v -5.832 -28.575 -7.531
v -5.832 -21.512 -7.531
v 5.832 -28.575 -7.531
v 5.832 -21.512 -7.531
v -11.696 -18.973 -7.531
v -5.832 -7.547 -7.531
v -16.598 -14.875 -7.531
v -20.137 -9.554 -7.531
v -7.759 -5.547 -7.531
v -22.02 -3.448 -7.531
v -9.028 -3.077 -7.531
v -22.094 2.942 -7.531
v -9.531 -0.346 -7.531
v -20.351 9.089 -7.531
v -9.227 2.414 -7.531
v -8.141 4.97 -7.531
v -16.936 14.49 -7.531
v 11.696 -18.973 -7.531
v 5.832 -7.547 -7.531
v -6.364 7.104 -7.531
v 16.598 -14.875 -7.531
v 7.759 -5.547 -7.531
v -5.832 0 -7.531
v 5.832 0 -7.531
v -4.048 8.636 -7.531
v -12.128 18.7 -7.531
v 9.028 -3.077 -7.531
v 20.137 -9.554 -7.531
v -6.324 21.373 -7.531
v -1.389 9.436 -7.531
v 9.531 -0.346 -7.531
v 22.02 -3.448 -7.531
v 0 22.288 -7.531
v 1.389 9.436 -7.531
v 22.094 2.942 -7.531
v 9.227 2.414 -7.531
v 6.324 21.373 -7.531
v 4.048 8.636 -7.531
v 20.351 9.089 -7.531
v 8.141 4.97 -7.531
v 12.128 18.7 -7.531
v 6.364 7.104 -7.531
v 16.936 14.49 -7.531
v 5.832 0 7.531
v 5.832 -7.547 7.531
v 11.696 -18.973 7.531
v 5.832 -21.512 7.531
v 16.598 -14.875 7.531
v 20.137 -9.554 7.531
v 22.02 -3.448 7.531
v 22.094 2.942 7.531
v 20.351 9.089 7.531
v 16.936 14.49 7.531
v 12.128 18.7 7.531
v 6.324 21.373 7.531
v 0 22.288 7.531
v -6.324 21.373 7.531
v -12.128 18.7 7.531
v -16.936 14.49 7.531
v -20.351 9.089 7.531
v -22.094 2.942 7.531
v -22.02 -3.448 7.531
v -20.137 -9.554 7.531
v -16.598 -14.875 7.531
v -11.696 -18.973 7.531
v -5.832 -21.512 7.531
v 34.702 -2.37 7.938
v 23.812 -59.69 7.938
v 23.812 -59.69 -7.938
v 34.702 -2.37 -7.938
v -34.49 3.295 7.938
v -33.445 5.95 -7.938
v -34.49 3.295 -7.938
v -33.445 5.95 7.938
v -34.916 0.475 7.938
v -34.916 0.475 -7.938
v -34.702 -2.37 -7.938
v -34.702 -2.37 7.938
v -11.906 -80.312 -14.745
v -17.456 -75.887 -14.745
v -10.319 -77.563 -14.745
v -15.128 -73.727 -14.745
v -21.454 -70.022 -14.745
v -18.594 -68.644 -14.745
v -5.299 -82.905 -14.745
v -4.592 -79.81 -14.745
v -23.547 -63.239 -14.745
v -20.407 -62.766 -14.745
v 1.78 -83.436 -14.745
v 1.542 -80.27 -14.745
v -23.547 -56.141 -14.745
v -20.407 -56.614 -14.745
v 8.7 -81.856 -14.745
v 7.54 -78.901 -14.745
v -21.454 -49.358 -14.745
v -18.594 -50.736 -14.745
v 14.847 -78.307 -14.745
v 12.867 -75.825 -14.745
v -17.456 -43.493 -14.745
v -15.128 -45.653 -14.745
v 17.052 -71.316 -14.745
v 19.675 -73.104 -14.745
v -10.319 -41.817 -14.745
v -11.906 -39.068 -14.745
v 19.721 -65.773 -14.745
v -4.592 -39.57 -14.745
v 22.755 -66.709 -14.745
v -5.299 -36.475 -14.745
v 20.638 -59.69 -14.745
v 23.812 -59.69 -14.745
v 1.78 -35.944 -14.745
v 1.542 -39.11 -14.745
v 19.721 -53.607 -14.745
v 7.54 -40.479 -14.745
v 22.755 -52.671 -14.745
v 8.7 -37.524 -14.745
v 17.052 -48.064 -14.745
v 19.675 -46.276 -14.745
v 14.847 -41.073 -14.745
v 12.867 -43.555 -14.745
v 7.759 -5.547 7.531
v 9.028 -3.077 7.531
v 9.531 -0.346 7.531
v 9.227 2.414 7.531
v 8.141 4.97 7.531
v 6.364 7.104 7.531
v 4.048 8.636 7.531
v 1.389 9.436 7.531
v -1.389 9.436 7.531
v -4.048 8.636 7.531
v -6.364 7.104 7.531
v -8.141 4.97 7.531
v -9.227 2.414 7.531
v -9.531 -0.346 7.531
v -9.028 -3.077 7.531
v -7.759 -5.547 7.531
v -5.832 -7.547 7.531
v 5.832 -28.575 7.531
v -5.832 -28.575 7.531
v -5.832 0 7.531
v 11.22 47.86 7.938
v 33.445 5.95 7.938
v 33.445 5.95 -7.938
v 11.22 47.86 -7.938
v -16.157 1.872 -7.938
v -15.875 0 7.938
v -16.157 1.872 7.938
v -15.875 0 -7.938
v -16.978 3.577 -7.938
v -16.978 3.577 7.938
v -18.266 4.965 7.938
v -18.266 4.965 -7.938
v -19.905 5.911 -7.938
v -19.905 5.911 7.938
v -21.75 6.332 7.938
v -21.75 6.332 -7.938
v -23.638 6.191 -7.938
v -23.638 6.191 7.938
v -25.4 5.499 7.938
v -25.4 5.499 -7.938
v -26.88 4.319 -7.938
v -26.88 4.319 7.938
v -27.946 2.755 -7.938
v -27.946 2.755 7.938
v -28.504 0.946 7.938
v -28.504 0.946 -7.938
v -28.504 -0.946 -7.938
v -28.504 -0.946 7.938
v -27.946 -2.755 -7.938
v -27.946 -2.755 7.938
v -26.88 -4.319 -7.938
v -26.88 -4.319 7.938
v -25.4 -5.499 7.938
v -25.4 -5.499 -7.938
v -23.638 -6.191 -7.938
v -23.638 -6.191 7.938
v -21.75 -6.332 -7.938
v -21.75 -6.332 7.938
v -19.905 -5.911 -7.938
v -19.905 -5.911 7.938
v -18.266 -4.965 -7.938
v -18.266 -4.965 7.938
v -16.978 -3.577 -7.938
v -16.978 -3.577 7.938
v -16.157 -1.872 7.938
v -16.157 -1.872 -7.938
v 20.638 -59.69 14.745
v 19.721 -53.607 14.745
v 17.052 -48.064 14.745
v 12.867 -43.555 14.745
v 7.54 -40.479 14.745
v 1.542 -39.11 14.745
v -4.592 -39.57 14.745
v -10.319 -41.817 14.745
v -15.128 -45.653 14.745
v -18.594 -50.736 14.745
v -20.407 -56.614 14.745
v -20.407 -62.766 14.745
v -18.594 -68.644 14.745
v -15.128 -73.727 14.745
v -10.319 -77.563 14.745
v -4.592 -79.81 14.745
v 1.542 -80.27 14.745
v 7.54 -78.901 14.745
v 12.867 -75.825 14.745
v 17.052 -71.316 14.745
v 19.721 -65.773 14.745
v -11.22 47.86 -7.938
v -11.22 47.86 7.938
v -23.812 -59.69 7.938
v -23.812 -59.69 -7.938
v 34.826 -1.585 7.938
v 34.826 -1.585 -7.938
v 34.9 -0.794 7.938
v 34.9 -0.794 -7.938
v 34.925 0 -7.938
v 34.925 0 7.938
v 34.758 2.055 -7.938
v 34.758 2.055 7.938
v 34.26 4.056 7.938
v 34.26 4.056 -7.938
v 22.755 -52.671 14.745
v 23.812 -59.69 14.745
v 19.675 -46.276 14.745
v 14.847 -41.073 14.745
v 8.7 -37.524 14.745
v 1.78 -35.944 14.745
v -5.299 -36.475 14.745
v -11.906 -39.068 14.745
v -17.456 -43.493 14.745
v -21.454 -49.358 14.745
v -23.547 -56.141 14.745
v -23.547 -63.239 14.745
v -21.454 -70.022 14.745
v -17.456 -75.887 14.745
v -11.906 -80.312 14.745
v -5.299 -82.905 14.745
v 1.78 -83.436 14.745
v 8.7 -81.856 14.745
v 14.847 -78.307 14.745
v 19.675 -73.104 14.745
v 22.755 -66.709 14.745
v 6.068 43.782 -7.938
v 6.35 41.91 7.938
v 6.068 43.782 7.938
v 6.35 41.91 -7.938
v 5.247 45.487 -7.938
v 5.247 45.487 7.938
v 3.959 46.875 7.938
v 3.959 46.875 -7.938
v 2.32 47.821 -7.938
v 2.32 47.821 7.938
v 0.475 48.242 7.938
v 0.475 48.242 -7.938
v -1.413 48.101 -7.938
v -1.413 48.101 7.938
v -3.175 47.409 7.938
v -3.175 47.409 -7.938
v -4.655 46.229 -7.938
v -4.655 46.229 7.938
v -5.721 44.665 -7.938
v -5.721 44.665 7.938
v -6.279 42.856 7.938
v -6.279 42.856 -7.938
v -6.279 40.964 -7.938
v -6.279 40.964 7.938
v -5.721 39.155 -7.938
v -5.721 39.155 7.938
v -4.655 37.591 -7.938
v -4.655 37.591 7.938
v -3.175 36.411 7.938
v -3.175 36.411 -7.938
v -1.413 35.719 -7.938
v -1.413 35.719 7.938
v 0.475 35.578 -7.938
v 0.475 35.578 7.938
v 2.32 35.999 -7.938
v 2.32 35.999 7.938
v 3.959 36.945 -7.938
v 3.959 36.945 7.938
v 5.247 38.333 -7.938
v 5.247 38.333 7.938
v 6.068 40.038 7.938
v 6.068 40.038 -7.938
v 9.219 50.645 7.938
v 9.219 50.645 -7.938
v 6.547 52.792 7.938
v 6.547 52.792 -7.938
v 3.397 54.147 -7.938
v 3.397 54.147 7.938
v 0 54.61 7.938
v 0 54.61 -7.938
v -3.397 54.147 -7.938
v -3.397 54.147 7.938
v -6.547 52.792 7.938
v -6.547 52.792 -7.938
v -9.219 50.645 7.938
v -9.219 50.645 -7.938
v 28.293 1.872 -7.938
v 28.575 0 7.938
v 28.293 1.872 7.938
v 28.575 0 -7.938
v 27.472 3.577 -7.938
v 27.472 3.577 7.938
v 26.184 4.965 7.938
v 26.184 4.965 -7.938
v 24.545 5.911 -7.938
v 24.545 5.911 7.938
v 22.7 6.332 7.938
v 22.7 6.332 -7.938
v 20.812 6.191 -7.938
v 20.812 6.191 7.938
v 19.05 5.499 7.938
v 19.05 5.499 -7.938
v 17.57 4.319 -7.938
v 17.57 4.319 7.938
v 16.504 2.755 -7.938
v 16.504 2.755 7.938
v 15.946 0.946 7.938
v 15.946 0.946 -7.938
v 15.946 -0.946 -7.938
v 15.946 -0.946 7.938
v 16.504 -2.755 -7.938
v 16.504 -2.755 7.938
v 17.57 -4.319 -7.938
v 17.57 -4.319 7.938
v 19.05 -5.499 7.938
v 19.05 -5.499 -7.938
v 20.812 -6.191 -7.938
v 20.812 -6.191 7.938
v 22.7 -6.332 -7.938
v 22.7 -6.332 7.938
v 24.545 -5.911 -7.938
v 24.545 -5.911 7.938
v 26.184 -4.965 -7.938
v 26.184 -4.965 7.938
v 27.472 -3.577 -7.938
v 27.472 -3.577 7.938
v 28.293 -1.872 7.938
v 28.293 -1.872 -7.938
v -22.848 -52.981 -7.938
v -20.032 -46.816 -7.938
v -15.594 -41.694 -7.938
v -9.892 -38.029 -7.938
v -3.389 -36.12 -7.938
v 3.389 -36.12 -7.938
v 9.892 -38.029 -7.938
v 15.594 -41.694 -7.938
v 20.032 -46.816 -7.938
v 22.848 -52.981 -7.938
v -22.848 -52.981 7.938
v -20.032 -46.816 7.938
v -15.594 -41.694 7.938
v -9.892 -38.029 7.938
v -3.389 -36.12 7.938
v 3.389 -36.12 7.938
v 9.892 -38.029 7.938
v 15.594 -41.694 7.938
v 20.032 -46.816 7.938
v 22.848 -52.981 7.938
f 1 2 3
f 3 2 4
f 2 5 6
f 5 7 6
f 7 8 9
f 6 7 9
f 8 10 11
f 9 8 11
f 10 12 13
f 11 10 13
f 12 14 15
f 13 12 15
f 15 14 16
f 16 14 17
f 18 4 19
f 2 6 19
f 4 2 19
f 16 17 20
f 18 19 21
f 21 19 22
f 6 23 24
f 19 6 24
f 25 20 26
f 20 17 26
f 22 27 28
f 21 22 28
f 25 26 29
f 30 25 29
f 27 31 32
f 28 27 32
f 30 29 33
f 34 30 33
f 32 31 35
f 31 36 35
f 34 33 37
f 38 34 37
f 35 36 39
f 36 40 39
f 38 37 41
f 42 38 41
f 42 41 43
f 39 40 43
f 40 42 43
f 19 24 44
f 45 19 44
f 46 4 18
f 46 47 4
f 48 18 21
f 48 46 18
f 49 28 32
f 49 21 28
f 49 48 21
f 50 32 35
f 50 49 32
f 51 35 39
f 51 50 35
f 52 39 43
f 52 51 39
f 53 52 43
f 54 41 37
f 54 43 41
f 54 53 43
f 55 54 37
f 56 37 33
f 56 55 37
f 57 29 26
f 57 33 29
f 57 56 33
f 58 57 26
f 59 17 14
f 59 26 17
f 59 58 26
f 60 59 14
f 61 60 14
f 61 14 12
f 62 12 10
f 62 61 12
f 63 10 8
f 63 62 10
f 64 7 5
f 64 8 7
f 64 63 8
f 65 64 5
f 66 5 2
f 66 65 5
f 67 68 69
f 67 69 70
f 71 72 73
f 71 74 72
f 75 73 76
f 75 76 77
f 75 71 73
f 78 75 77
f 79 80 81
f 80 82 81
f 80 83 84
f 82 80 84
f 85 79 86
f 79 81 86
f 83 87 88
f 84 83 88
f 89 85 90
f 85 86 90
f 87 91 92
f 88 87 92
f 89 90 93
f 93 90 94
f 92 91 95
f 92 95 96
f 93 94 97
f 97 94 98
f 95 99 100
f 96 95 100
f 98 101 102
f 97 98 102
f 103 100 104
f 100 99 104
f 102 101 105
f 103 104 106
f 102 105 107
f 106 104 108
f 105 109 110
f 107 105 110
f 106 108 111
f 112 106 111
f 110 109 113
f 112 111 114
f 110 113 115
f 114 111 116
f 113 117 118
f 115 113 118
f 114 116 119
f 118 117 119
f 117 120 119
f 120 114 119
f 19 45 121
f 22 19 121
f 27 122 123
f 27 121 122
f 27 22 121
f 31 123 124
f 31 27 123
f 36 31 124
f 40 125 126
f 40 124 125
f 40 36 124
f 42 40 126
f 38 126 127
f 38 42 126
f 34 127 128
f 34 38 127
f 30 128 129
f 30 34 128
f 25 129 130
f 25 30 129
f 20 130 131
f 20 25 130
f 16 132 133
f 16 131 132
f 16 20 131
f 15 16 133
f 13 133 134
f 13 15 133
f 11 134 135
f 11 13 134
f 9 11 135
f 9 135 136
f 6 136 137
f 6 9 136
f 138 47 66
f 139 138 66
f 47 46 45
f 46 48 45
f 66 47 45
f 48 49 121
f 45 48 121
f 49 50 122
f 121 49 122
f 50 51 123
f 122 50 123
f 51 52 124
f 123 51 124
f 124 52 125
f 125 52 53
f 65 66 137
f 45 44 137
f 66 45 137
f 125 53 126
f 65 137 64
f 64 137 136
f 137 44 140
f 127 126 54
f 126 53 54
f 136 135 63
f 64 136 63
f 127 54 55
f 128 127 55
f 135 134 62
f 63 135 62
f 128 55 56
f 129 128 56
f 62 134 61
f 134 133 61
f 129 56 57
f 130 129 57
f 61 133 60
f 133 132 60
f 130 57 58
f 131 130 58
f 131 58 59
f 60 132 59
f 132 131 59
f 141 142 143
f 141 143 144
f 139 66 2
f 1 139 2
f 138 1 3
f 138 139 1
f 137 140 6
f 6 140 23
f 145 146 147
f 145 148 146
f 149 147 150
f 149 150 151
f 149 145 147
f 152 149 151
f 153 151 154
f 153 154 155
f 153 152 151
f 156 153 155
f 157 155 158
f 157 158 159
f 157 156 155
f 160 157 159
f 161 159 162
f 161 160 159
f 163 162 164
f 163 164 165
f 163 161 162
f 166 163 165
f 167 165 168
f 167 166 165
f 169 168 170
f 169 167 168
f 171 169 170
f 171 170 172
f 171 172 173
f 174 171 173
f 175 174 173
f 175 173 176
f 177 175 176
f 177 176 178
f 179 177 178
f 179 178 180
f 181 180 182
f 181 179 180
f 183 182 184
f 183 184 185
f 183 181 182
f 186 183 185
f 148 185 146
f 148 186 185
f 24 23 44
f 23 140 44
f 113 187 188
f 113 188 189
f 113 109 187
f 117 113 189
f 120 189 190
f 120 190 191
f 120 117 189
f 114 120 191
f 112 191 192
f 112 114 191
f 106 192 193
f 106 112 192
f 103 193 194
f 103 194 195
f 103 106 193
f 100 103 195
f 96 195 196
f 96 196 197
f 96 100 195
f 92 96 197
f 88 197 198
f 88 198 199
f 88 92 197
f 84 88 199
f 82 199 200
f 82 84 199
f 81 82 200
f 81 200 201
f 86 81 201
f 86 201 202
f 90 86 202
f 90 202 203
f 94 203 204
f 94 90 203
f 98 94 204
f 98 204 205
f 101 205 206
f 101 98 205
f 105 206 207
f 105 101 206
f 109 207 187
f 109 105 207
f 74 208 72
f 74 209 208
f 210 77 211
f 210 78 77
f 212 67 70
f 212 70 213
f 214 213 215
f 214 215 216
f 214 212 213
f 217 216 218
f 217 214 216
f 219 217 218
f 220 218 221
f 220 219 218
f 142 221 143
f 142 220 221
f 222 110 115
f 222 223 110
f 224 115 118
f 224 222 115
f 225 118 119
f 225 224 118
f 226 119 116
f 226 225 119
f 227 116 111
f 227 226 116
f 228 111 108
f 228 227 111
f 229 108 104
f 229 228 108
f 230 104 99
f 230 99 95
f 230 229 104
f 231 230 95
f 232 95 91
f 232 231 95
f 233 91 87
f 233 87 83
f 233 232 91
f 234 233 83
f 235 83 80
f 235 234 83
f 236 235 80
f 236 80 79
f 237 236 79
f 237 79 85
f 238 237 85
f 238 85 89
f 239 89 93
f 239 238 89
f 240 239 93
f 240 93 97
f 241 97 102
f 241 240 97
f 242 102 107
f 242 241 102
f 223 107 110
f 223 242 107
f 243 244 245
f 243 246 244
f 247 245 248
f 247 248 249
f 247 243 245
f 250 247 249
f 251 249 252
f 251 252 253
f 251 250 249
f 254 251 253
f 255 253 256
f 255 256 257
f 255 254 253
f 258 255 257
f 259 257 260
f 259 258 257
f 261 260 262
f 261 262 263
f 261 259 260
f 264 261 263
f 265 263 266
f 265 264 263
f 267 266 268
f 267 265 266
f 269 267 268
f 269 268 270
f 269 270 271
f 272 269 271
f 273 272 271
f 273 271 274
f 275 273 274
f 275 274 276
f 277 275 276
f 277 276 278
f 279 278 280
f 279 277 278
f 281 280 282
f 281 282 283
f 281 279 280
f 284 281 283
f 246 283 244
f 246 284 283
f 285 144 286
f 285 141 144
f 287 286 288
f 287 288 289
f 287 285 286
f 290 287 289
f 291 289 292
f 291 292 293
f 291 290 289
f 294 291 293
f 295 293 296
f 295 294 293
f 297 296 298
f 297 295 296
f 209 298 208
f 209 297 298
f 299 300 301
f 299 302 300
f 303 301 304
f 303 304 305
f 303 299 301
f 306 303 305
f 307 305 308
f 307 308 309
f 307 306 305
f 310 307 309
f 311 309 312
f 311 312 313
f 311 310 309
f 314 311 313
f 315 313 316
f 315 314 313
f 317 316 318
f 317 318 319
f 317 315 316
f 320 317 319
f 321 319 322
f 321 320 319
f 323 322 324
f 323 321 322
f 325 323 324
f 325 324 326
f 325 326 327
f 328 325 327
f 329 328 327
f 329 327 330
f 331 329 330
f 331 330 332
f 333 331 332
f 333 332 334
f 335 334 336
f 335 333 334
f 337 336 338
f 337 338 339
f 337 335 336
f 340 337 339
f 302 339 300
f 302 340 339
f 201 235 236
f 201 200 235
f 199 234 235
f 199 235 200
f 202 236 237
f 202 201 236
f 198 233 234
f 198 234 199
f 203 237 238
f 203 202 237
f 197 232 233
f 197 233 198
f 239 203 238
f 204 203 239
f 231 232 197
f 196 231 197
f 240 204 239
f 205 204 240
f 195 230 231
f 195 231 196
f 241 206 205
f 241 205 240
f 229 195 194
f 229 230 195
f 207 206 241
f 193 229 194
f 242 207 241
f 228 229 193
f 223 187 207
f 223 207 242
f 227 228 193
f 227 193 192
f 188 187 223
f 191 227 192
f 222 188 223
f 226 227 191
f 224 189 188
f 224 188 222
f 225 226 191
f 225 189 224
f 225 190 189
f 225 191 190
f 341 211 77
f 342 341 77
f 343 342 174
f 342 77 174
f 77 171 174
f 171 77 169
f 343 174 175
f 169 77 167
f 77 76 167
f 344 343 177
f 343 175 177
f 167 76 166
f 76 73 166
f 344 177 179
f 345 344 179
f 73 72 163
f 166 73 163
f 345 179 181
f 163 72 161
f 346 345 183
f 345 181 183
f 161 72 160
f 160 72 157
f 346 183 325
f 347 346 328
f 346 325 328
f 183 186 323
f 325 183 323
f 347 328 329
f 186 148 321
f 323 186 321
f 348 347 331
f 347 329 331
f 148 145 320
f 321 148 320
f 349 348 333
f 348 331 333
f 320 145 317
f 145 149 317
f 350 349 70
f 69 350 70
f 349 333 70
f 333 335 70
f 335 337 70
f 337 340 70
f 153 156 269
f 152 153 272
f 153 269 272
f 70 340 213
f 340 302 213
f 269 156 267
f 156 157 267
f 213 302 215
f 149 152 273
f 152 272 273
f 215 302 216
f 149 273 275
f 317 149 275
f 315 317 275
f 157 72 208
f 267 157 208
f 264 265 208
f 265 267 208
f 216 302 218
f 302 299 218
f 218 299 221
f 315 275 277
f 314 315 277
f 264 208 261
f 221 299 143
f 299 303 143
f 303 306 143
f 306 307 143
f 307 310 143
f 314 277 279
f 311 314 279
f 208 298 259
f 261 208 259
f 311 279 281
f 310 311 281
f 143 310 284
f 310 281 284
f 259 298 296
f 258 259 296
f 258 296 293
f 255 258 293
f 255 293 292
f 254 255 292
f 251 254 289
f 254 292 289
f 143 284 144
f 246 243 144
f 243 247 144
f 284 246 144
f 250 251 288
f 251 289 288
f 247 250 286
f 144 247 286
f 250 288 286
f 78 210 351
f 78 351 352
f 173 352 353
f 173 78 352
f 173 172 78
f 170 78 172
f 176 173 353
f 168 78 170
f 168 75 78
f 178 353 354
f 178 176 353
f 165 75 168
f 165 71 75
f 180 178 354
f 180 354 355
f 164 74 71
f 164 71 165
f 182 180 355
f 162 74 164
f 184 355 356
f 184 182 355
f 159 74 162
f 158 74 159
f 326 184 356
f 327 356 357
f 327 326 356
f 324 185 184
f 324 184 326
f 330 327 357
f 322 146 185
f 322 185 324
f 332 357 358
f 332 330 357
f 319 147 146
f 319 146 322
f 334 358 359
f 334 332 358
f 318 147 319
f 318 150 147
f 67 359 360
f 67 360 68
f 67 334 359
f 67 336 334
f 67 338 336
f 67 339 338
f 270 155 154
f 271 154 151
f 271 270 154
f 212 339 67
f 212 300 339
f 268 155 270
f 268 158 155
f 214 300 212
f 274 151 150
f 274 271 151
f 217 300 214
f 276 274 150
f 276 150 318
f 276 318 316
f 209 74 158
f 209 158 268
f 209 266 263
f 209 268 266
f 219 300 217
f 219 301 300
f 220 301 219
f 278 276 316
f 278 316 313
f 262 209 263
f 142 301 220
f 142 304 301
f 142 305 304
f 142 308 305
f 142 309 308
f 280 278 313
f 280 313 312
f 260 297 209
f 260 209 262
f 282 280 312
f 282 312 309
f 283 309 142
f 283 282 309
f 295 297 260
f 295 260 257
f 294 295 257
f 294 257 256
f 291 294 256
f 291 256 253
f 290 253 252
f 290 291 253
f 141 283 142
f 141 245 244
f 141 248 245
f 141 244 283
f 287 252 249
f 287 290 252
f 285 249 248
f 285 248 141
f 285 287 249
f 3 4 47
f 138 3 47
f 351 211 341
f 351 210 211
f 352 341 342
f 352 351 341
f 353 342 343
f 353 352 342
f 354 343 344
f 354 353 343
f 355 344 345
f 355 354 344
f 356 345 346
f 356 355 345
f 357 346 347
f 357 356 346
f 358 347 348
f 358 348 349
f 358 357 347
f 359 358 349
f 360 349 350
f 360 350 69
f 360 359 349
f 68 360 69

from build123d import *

# Parameters (mm, degrees)
F0_R     = 22.2885
F0_R_2   = 9.5377
F1_DEPTH = 7.5311
F4_DEPTH = 28.575
F5_R     = 6.35
F6_DEPTH = 7.9375
F5_R_2   = 20.6375
F7_DEPTH = 14.7447


with BuildPart() as f1:
    # F0 (on Top) → F1 (new body, symmetric)
    with BuildSketch(Plane.XY):
        Circle(F0_R)
        Circle(F0_R_2, mode=Mode.SUBTRACT)
    extrude(amount=F1_DEPTH, both=True)

    # F3 (on Front) → F4 (join)
    with BuildSketch(Plane.XZ):
        Polygon((-5.8316513776, 0), (-5.8316513776, -7.5311), (5.8316513776, -7.5311), (5.8316513776, 0), (0, 0), align=None)
        Polygon((-5.8316513776, 7.5311), (-5.8316513776, 0), (0, 0), (5.8316513776, 0), (5.8316513776, 7.5311), align=None)
    extrude(amount=F4_DEPTH)


with BuildPart() as f6:
    # F5 (on Top) → F6 (new body, symmetric)
    with BuildSketch(Plane.XY):
        with BuildLine():
            ThreePointArc((-23.8125, -59.69), (0, -35.8775), (23.8125, -59.69))
            Line((23.8125, -59.69), (34.7018463097, -2.3702966407))
            ThreePointArc((34.7018463097, -2.3702966407), (9.667471368, -1.8969645902), (33.4449686963, 5.9499833995))
            Line((33.4449686963, 5.9499833995), (11.2199686963, 47.8599833995))
            ThreePointArc((11.2199686963, 47.8599833995), (12.3244391849, 44.9756481825), (12.7, 41.91))
            ThreePointArc((12.7, 41.91), (-3.0656481825, 29.5855608151), (-11.2199686963, 47.8599833995))
            Line((-11.2199686963, 47.8599833995), (-33.4449686963, 5.9499833995))
            ThreePointArc((-33.4449686963, 5.9499833995), (-19.1593518175, 12.3244391849), (-9.525, 0))
            ThreePointArc((-9.525, 0), (-21.0346110158, -12.6440885028), (-34.7018463097, -2.3702966407))
            Line((-34.7018463097, -2.3702966407), (-23.8125, -59.69))
        make_face()
        with BuildLine():
            ThreePointArc((-33.4449686963, 5.9499833995), (-34.782528632, 1.8969645902), (-34.7018463097, -2.3702966407))
            ThreePointArc((-34.7018463097, -2.3702966407), (-21.0346110158, -12.6440885028), (-9.525, 0))
            ThreePointArc((-9.525, 0), (-19.1593518175, 12.3244391849), (-33.4449686963, 5.9499833995))
        make_face()
        with Locations((-22.225, 0)):
            Circle(F5_R, mode=Mode.SUBTRACT)
        with BuildLine():
            ThreePointArc((33.4449686963, 5.9499833995), (9.667471368, -1.8969645902), (34.7018463097, -2.3702966407))
            ThreePointArc((34.7018463097, -2.3702966407), (34.8690885028, -1.1903889842), (34.925, 0))
            ThreePointArc((34.925, 0), (34.5494391849, 3.0656481825), (33.4449686963, 5.9499833995))
        make_face()
        with Locations((22.225, 0)):
            Circle(F5_R, mode=Mode.SUBTRACT)
        with BuildLine():
            ThreePointArc((12.7, 41.91), (12.3244391849, 44.9756481825), (11.2199686963, 47.8599833995))
            ThreePointArc((11.2199686963, 47.8599833995), (0, 54.61), (-11.2199686963, 47.8599833995))
            ThreePointArc((-11.2199686963, 47.8599833995), (-3.0656481825, 29.5855608151), (12.7, 41.91))
        make_face()
        with Locations((0, 41.91)):
            Circle(F5_R, mode=Mode.SUBTRACT)
    extrude(amount=F6_DEPTH, both=True)


with BuildPart() as f7:
    # F5 (on Top) → F7 (new body, symmetric)
    with BuildSketch(Plane.XY):
        with BuildLine():
            ThreePointArc((-23.8125, -59.69), (0, -83.5025), (23.8125, -59.69))
            ThreePointArc((23.8125, -59.69), (0, -35.8775), (-23.8125, -59.69))
        make_face()
        with Locations((0, -59.69)):
            Circle(F5_R_2, mode=Mode.SUBTRACT)
    extrude(amount=F7_DEPTH, both=True)


solid = Compound([f1.part, f6.part, f7.part])
